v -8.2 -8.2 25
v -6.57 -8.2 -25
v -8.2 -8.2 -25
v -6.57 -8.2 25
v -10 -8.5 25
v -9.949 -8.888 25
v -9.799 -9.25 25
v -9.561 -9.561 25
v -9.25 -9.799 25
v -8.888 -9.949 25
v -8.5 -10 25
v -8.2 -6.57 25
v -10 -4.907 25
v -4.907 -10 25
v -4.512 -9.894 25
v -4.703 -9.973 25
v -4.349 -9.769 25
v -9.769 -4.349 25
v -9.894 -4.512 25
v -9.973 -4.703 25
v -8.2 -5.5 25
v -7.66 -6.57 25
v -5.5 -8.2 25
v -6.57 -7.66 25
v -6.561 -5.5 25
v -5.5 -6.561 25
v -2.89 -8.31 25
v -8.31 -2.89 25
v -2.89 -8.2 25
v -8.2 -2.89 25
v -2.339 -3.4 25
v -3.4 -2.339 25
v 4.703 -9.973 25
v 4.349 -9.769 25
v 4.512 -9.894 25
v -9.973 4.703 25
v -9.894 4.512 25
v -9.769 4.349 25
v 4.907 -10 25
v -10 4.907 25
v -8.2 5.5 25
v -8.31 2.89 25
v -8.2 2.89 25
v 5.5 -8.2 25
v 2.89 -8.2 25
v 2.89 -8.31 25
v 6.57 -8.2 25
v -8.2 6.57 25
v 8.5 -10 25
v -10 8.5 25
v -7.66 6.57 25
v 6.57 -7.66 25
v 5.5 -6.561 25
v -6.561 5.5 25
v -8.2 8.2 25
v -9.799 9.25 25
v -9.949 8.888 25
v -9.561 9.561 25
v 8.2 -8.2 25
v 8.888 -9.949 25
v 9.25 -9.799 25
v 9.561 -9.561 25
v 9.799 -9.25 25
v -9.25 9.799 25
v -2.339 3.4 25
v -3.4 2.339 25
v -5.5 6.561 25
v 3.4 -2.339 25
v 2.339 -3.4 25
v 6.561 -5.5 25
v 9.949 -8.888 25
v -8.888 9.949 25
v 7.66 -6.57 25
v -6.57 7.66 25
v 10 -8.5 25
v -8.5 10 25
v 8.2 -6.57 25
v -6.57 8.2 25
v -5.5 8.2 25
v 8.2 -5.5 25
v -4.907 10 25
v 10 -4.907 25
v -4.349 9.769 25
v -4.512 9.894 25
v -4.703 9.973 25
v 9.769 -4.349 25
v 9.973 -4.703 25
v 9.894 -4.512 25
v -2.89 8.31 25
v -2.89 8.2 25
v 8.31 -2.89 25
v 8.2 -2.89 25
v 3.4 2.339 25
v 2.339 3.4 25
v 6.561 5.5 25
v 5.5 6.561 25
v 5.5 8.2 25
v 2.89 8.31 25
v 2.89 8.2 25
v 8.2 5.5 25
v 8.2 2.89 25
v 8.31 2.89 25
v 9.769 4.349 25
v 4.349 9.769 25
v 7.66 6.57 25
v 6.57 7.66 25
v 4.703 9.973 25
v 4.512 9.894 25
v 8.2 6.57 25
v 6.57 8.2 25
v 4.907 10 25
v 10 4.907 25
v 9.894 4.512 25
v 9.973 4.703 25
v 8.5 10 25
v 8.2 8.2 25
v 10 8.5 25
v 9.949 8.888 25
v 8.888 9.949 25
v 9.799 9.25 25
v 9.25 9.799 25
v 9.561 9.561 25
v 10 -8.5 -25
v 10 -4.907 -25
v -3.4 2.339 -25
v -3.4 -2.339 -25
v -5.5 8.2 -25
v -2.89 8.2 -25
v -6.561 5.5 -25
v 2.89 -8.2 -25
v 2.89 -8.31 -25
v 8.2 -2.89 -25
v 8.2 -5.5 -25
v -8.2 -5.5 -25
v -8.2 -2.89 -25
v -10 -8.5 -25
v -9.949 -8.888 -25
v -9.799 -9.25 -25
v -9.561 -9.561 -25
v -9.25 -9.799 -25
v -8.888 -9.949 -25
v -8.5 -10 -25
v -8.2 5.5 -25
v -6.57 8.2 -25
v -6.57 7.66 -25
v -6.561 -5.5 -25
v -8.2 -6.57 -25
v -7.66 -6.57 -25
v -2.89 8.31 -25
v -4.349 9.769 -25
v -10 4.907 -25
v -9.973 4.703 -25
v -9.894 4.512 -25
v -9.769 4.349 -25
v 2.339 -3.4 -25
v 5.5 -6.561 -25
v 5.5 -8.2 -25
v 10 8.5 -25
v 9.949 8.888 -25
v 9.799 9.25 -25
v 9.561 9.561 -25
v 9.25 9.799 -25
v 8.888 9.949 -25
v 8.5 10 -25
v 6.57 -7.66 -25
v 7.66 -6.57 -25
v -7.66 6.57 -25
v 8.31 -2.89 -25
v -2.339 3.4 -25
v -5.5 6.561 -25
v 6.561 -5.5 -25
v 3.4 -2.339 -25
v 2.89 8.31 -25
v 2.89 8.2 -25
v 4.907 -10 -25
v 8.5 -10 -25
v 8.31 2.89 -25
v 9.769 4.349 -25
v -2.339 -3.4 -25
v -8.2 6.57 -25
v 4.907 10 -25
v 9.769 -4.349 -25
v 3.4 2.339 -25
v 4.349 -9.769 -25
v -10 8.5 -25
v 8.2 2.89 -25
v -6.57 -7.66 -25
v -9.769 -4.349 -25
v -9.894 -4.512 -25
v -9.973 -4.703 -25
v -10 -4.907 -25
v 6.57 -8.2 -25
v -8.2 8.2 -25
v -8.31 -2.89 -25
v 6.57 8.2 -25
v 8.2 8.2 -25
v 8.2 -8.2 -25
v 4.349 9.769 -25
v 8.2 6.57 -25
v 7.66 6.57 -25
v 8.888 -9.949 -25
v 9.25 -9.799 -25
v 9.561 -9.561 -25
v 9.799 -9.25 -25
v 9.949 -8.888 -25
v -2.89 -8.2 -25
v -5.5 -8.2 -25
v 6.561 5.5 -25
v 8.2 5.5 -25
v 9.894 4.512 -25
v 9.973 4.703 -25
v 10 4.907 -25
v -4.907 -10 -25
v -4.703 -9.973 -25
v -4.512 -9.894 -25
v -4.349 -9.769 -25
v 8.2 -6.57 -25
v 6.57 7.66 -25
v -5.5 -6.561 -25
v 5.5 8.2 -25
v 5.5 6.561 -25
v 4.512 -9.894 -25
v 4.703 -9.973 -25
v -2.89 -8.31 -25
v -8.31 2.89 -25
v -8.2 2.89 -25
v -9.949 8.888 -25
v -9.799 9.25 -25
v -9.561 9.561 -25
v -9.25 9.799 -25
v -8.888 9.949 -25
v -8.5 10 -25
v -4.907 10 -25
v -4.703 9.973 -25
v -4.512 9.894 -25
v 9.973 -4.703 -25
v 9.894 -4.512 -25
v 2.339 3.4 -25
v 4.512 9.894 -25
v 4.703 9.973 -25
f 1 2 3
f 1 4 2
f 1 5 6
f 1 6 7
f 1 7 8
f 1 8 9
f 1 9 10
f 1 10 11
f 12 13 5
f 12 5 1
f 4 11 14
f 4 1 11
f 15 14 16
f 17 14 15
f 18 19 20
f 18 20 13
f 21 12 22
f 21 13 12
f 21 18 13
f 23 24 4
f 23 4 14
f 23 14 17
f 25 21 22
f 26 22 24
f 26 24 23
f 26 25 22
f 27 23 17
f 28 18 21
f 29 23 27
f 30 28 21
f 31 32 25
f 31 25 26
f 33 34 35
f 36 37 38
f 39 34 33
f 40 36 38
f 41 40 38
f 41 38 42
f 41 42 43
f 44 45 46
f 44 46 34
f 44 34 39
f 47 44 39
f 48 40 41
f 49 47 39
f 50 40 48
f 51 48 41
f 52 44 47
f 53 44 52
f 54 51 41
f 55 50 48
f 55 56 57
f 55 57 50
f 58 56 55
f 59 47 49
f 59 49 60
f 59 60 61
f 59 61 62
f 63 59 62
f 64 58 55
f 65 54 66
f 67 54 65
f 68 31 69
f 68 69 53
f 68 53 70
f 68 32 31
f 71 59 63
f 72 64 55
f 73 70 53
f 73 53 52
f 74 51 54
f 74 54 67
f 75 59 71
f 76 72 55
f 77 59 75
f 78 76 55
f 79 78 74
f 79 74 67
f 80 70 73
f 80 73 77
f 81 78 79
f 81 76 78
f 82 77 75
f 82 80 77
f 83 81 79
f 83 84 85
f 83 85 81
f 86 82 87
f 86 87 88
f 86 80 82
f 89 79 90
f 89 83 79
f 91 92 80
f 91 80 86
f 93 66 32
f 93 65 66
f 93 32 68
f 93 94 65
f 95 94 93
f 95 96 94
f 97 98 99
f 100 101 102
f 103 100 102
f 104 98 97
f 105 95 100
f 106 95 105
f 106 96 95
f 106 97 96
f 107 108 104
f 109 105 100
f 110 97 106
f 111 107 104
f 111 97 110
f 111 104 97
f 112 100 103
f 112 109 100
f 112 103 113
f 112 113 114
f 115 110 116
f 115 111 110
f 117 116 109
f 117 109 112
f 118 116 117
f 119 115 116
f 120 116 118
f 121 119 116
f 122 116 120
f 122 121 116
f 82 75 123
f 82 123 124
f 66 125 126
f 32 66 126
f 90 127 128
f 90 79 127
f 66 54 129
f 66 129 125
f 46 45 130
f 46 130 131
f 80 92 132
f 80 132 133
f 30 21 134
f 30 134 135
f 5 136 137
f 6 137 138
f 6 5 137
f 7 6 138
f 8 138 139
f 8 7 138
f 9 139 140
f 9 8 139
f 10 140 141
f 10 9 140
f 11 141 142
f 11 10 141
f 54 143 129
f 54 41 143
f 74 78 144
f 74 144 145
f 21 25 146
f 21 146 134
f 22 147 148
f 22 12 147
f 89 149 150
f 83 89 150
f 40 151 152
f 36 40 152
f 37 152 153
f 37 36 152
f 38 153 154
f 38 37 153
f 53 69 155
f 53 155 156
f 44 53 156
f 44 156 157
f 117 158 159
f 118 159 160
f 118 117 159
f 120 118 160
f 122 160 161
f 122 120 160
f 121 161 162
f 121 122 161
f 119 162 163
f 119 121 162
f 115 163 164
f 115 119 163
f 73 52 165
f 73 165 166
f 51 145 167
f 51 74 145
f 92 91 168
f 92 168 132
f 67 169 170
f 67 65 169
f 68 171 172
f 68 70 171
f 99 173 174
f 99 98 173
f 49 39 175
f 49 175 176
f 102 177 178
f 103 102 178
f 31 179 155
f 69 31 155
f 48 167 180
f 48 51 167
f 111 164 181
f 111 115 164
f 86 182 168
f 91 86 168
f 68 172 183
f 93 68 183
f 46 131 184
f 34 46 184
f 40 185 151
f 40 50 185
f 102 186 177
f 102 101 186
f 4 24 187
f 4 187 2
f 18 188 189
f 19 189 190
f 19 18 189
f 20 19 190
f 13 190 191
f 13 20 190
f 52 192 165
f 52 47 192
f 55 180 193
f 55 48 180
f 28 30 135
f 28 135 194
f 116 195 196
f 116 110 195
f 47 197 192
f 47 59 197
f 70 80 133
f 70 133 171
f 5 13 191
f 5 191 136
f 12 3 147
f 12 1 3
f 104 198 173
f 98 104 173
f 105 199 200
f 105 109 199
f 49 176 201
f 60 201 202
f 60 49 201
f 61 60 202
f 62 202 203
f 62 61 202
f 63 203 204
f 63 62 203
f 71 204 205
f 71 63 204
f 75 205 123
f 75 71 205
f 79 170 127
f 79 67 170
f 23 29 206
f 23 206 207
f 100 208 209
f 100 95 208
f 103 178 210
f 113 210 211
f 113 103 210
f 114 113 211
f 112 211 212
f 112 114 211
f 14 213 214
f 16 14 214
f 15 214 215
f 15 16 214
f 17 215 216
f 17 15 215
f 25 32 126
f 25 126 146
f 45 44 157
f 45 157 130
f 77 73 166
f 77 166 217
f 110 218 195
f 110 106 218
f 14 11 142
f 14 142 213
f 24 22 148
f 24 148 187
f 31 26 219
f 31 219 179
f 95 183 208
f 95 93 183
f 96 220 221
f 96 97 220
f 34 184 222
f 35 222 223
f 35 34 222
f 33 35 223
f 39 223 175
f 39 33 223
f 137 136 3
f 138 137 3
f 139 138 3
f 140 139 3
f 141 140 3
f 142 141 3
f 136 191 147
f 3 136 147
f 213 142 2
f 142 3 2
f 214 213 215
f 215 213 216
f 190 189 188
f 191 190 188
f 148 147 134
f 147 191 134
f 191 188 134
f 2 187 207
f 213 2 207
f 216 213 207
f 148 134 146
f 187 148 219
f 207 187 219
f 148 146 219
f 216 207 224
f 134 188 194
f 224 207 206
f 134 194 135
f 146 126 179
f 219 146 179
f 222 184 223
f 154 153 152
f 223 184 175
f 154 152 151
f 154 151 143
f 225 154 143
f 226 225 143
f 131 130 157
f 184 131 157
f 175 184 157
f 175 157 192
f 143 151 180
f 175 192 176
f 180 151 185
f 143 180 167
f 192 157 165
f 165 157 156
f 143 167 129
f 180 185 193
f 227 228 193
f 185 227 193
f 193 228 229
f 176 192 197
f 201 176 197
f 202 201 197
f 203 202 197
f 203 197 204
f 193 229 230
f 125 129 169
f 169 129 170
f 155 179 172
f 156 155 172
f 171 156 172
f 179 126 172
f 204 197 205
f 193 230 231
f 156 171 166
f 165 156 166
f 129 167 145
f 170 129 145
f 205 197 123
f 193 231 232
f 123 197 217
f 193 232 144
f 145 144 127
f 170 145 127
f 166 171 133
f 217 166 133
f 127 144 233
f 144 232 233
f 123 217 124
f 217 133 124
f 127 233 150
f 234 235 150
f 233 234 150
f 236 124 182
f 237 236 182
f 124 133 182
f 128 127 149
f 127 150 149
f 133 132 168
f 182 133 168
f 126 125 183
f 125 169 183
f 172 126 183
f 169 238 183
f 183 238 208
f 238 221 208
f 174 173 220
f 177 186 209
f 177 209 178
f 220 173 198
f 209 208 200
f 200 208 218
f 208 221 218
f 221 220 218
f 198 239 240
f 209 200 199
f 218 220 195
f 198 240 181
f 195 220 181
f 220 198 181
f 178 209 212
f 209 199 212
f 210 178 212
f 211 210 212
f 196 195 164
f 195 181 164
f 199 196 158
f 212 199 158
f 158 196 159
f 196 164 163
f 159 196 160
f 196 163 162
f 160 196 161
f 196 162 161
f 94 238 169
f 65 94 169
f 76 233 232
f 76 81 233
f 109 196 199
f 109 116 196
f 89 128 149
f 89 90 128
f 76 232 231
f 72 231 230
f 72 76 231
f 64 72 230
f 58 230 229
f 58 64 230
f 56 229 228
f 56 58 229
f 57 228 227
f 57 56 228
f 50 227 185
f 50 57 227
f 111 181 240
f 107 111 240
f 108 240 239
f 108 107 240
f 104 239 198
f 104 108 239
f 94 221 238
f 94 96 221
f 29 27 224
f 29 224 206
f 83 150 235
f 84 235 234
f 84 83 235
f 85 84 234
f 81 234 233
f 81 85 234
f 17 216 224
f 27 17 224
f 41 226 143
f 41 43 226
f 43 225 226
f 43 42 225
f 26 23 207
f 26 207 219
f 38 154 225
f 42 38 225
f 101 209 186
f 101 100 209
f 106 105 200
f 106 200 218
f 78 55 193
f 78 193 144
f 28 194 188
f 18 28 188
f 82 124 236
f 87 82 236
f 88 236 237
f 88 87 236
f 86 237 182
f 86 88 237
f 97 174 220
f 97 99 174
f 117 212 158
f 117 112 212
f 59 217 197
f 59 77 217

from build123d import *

# Parameters (mm, degrees)
F1_DEPTH = 25


with BuildPart() as f1:
    # F0 (on Top) → F1 (new body, symmetric)
    with BuildSketch(Plane.XY):
        with BuildLine():
            Line((-8.2, 5.5), (-6.56066, 5.5))
            Line((-6.56066, 5.5), (-3.4, 2.33934))
            Line((-3.4, 2.33934), (-3.4, -2.33934))
            Line((-3.4, -2.33934), (-6.56066, -5.5))
            Line((-6.56066, -5.5), (-8.2, -5.5))
            Line((-8.2, -5.5), (-8.2, -2.89))
            Line((-8.2, -2.89), (-8.31, -2.89))
            Line((-8.31, -2.89), (-9.768614, -4.348614))
            ThreePointArc((-9.768614, -4.348614), (-9.939865, -4.604909), (-10, -4.907229))
            Line((-10, -4.907229), (-10, -8.5))
            ThreePointArc((-10, -8.5), (-9.56066, -9.56066), (-8.5, -10))
            Line((-8.5, -10), (-4.907229, -10))
            ThreePointArc((-4.907229, -10), (-4.604909, -9.939865), (-4.348614, -9.768614))
            Line((-4.348614, -9.768614), (-2.89, -8.31))
            Line((-2.89, -8.31), (-2.89, -8.2))
            Line((-2.89, -8.2), (-5.5, -8.2))
            Line((-5.5, -8.2), (-5.5, -6.56066))
            Line((-5.5, -6.56066), (-2.33934, -3.4))
            Line((-2.33934, -3.4), (2.33934, -3.4))
            Line((2.33934, -3.4), (5.5, -6.56066))
            Line((5.5, -6.56066), (5.5, -8.2))
            Line((5.5, -8.2), (2.89, -8.2))
            Line((2.89, -8.2), (2.89, -8.31))
            Line((2.89, -8.31), (4.348614, -9.768614))
            ThreePointArc((4.348614, -9.768614), (4.604909, -9.939865), (4.907229, -10))
            Line((4.907229, -10), (8.5, -10))
            ThreePointArc((8.5, -10), (9.56066, -9.56066), (10, -8.5))
            Line((10, -8.5), (10, -4.907229))
            ThreePointArc((10, -4.907229), (9.939865, -4.604909), (9.768614, -4.348614))
            Line((9.768614, -4.348614), (8.31, -2.89))
            Line((8.31, -2.89), (8.2, -2.89))
            Line((8.2, -2.89), (8.2, -5.5))
            Line((8.2, -5.5), (6.56066, -5.5))
            Line((6.56066, -5.5), (3.4, -2.33934))
            Line((3.4, -2.33934), (3.4, 2.33934))
            Line((3.4, 2.33934), (6.56066, 5.5))
            Line((6.56066, 5.5), (8.2, 5.5))
            Line((8.2, 5.5), (8.2, 2.89))
            Line((8.2, 2.89), (8.31, 2.89))
            Line((8.31, 2.89), (9.768614, 4.348614))
            ThreePointArc((9.768614, 4.348614), (9.939865, 4.604909), (10, 4.907229))
            Line((10, 4.907229), (10, 8.5))
            ThreePointArc((10, 8.5), (9.56066, 9.56066), (8.5, 10))
            Line((8.5, 10), (4.907229, 10))
            ThreePointArc((4.907229, 10), (4.604909, 9.939865), (4.348614, 9.768614))
            Line((4.348614, 9.768614), (2.89, 8.31))
            Line((2.89, 8.31), (2.89, 8.2))
            Line((2.89, 8.2), (5.5, 8.2))
            Line((5.5, 8.2), (5.5, 6.56066))
            Line((5.5, 6.56066), (2.33934, 3.4))
            Line((2.33934, 3.4), (-2.33934, 3.4))
            Line((-2.33934, 3.4), (-5.5, 6.56066))
            Line((-5.5, 6.56066), (-5.5, 8.2))
            Line((-5.5, 8.2), (-2.89, 8.2))
            Line((-2.89, 8.2), (-2.89, 8.31))
            Line((-2.89, 8.31), (-4.348614, 9.768614))
            ThreePointArc((-4.348614, 9.768614), (-4.604909, 9.939865), (-4.907229, 10))
            Line((-4.907229, 10), (-8.5, 10))
            ThreePointArc((-8.5, 10), (-9.56066, 9.56066), (-10, 8.5))
            Line((-10, 8.5), (-10, 4.907229))
            ThreePointArc((-10, 4.907229), (-9.939865, 4.604909), (-9.768614, 4.348614))
            Line((-9.768614, 4.348614), (-8.31, 2.89))
            Line((-8.31, 2.89), (-8.2, 2.89))
            Line((-8.2, 2.89), (-8.2, 5.5))
        make_face()
        Polygon((-7.66, -6.57), (-6.57, -7.66), (-6.57, -8.2), (-8.2, -8.2), (-8.2, -6.57), align=None, mode=Mode.SUBTRACT)
        Polygon((6.57, -7.66), (7.66, -6.57), (8.2, -6.57), (8.2, -8.2), (6.57, -8.2), align=None, mode=Mode.SUBTRACT)
        Polygon((-8.2, 8.2), (-6.57, 8.2), (-6.57, 7.66), (-7.66, 6.57), (-8.2, 6.57), align=None, mode=Mode.SUBTRACT)
        Polygon((7.66, 6.57), (6.57, 7.66), (6.57, 8.2), (8.2, 8.2), (8.2, 6.57), align=None, mode=Mode.SUBTRACT)
    extrude(amount=F1_DEPTH, both=True)


solid = f1.part
